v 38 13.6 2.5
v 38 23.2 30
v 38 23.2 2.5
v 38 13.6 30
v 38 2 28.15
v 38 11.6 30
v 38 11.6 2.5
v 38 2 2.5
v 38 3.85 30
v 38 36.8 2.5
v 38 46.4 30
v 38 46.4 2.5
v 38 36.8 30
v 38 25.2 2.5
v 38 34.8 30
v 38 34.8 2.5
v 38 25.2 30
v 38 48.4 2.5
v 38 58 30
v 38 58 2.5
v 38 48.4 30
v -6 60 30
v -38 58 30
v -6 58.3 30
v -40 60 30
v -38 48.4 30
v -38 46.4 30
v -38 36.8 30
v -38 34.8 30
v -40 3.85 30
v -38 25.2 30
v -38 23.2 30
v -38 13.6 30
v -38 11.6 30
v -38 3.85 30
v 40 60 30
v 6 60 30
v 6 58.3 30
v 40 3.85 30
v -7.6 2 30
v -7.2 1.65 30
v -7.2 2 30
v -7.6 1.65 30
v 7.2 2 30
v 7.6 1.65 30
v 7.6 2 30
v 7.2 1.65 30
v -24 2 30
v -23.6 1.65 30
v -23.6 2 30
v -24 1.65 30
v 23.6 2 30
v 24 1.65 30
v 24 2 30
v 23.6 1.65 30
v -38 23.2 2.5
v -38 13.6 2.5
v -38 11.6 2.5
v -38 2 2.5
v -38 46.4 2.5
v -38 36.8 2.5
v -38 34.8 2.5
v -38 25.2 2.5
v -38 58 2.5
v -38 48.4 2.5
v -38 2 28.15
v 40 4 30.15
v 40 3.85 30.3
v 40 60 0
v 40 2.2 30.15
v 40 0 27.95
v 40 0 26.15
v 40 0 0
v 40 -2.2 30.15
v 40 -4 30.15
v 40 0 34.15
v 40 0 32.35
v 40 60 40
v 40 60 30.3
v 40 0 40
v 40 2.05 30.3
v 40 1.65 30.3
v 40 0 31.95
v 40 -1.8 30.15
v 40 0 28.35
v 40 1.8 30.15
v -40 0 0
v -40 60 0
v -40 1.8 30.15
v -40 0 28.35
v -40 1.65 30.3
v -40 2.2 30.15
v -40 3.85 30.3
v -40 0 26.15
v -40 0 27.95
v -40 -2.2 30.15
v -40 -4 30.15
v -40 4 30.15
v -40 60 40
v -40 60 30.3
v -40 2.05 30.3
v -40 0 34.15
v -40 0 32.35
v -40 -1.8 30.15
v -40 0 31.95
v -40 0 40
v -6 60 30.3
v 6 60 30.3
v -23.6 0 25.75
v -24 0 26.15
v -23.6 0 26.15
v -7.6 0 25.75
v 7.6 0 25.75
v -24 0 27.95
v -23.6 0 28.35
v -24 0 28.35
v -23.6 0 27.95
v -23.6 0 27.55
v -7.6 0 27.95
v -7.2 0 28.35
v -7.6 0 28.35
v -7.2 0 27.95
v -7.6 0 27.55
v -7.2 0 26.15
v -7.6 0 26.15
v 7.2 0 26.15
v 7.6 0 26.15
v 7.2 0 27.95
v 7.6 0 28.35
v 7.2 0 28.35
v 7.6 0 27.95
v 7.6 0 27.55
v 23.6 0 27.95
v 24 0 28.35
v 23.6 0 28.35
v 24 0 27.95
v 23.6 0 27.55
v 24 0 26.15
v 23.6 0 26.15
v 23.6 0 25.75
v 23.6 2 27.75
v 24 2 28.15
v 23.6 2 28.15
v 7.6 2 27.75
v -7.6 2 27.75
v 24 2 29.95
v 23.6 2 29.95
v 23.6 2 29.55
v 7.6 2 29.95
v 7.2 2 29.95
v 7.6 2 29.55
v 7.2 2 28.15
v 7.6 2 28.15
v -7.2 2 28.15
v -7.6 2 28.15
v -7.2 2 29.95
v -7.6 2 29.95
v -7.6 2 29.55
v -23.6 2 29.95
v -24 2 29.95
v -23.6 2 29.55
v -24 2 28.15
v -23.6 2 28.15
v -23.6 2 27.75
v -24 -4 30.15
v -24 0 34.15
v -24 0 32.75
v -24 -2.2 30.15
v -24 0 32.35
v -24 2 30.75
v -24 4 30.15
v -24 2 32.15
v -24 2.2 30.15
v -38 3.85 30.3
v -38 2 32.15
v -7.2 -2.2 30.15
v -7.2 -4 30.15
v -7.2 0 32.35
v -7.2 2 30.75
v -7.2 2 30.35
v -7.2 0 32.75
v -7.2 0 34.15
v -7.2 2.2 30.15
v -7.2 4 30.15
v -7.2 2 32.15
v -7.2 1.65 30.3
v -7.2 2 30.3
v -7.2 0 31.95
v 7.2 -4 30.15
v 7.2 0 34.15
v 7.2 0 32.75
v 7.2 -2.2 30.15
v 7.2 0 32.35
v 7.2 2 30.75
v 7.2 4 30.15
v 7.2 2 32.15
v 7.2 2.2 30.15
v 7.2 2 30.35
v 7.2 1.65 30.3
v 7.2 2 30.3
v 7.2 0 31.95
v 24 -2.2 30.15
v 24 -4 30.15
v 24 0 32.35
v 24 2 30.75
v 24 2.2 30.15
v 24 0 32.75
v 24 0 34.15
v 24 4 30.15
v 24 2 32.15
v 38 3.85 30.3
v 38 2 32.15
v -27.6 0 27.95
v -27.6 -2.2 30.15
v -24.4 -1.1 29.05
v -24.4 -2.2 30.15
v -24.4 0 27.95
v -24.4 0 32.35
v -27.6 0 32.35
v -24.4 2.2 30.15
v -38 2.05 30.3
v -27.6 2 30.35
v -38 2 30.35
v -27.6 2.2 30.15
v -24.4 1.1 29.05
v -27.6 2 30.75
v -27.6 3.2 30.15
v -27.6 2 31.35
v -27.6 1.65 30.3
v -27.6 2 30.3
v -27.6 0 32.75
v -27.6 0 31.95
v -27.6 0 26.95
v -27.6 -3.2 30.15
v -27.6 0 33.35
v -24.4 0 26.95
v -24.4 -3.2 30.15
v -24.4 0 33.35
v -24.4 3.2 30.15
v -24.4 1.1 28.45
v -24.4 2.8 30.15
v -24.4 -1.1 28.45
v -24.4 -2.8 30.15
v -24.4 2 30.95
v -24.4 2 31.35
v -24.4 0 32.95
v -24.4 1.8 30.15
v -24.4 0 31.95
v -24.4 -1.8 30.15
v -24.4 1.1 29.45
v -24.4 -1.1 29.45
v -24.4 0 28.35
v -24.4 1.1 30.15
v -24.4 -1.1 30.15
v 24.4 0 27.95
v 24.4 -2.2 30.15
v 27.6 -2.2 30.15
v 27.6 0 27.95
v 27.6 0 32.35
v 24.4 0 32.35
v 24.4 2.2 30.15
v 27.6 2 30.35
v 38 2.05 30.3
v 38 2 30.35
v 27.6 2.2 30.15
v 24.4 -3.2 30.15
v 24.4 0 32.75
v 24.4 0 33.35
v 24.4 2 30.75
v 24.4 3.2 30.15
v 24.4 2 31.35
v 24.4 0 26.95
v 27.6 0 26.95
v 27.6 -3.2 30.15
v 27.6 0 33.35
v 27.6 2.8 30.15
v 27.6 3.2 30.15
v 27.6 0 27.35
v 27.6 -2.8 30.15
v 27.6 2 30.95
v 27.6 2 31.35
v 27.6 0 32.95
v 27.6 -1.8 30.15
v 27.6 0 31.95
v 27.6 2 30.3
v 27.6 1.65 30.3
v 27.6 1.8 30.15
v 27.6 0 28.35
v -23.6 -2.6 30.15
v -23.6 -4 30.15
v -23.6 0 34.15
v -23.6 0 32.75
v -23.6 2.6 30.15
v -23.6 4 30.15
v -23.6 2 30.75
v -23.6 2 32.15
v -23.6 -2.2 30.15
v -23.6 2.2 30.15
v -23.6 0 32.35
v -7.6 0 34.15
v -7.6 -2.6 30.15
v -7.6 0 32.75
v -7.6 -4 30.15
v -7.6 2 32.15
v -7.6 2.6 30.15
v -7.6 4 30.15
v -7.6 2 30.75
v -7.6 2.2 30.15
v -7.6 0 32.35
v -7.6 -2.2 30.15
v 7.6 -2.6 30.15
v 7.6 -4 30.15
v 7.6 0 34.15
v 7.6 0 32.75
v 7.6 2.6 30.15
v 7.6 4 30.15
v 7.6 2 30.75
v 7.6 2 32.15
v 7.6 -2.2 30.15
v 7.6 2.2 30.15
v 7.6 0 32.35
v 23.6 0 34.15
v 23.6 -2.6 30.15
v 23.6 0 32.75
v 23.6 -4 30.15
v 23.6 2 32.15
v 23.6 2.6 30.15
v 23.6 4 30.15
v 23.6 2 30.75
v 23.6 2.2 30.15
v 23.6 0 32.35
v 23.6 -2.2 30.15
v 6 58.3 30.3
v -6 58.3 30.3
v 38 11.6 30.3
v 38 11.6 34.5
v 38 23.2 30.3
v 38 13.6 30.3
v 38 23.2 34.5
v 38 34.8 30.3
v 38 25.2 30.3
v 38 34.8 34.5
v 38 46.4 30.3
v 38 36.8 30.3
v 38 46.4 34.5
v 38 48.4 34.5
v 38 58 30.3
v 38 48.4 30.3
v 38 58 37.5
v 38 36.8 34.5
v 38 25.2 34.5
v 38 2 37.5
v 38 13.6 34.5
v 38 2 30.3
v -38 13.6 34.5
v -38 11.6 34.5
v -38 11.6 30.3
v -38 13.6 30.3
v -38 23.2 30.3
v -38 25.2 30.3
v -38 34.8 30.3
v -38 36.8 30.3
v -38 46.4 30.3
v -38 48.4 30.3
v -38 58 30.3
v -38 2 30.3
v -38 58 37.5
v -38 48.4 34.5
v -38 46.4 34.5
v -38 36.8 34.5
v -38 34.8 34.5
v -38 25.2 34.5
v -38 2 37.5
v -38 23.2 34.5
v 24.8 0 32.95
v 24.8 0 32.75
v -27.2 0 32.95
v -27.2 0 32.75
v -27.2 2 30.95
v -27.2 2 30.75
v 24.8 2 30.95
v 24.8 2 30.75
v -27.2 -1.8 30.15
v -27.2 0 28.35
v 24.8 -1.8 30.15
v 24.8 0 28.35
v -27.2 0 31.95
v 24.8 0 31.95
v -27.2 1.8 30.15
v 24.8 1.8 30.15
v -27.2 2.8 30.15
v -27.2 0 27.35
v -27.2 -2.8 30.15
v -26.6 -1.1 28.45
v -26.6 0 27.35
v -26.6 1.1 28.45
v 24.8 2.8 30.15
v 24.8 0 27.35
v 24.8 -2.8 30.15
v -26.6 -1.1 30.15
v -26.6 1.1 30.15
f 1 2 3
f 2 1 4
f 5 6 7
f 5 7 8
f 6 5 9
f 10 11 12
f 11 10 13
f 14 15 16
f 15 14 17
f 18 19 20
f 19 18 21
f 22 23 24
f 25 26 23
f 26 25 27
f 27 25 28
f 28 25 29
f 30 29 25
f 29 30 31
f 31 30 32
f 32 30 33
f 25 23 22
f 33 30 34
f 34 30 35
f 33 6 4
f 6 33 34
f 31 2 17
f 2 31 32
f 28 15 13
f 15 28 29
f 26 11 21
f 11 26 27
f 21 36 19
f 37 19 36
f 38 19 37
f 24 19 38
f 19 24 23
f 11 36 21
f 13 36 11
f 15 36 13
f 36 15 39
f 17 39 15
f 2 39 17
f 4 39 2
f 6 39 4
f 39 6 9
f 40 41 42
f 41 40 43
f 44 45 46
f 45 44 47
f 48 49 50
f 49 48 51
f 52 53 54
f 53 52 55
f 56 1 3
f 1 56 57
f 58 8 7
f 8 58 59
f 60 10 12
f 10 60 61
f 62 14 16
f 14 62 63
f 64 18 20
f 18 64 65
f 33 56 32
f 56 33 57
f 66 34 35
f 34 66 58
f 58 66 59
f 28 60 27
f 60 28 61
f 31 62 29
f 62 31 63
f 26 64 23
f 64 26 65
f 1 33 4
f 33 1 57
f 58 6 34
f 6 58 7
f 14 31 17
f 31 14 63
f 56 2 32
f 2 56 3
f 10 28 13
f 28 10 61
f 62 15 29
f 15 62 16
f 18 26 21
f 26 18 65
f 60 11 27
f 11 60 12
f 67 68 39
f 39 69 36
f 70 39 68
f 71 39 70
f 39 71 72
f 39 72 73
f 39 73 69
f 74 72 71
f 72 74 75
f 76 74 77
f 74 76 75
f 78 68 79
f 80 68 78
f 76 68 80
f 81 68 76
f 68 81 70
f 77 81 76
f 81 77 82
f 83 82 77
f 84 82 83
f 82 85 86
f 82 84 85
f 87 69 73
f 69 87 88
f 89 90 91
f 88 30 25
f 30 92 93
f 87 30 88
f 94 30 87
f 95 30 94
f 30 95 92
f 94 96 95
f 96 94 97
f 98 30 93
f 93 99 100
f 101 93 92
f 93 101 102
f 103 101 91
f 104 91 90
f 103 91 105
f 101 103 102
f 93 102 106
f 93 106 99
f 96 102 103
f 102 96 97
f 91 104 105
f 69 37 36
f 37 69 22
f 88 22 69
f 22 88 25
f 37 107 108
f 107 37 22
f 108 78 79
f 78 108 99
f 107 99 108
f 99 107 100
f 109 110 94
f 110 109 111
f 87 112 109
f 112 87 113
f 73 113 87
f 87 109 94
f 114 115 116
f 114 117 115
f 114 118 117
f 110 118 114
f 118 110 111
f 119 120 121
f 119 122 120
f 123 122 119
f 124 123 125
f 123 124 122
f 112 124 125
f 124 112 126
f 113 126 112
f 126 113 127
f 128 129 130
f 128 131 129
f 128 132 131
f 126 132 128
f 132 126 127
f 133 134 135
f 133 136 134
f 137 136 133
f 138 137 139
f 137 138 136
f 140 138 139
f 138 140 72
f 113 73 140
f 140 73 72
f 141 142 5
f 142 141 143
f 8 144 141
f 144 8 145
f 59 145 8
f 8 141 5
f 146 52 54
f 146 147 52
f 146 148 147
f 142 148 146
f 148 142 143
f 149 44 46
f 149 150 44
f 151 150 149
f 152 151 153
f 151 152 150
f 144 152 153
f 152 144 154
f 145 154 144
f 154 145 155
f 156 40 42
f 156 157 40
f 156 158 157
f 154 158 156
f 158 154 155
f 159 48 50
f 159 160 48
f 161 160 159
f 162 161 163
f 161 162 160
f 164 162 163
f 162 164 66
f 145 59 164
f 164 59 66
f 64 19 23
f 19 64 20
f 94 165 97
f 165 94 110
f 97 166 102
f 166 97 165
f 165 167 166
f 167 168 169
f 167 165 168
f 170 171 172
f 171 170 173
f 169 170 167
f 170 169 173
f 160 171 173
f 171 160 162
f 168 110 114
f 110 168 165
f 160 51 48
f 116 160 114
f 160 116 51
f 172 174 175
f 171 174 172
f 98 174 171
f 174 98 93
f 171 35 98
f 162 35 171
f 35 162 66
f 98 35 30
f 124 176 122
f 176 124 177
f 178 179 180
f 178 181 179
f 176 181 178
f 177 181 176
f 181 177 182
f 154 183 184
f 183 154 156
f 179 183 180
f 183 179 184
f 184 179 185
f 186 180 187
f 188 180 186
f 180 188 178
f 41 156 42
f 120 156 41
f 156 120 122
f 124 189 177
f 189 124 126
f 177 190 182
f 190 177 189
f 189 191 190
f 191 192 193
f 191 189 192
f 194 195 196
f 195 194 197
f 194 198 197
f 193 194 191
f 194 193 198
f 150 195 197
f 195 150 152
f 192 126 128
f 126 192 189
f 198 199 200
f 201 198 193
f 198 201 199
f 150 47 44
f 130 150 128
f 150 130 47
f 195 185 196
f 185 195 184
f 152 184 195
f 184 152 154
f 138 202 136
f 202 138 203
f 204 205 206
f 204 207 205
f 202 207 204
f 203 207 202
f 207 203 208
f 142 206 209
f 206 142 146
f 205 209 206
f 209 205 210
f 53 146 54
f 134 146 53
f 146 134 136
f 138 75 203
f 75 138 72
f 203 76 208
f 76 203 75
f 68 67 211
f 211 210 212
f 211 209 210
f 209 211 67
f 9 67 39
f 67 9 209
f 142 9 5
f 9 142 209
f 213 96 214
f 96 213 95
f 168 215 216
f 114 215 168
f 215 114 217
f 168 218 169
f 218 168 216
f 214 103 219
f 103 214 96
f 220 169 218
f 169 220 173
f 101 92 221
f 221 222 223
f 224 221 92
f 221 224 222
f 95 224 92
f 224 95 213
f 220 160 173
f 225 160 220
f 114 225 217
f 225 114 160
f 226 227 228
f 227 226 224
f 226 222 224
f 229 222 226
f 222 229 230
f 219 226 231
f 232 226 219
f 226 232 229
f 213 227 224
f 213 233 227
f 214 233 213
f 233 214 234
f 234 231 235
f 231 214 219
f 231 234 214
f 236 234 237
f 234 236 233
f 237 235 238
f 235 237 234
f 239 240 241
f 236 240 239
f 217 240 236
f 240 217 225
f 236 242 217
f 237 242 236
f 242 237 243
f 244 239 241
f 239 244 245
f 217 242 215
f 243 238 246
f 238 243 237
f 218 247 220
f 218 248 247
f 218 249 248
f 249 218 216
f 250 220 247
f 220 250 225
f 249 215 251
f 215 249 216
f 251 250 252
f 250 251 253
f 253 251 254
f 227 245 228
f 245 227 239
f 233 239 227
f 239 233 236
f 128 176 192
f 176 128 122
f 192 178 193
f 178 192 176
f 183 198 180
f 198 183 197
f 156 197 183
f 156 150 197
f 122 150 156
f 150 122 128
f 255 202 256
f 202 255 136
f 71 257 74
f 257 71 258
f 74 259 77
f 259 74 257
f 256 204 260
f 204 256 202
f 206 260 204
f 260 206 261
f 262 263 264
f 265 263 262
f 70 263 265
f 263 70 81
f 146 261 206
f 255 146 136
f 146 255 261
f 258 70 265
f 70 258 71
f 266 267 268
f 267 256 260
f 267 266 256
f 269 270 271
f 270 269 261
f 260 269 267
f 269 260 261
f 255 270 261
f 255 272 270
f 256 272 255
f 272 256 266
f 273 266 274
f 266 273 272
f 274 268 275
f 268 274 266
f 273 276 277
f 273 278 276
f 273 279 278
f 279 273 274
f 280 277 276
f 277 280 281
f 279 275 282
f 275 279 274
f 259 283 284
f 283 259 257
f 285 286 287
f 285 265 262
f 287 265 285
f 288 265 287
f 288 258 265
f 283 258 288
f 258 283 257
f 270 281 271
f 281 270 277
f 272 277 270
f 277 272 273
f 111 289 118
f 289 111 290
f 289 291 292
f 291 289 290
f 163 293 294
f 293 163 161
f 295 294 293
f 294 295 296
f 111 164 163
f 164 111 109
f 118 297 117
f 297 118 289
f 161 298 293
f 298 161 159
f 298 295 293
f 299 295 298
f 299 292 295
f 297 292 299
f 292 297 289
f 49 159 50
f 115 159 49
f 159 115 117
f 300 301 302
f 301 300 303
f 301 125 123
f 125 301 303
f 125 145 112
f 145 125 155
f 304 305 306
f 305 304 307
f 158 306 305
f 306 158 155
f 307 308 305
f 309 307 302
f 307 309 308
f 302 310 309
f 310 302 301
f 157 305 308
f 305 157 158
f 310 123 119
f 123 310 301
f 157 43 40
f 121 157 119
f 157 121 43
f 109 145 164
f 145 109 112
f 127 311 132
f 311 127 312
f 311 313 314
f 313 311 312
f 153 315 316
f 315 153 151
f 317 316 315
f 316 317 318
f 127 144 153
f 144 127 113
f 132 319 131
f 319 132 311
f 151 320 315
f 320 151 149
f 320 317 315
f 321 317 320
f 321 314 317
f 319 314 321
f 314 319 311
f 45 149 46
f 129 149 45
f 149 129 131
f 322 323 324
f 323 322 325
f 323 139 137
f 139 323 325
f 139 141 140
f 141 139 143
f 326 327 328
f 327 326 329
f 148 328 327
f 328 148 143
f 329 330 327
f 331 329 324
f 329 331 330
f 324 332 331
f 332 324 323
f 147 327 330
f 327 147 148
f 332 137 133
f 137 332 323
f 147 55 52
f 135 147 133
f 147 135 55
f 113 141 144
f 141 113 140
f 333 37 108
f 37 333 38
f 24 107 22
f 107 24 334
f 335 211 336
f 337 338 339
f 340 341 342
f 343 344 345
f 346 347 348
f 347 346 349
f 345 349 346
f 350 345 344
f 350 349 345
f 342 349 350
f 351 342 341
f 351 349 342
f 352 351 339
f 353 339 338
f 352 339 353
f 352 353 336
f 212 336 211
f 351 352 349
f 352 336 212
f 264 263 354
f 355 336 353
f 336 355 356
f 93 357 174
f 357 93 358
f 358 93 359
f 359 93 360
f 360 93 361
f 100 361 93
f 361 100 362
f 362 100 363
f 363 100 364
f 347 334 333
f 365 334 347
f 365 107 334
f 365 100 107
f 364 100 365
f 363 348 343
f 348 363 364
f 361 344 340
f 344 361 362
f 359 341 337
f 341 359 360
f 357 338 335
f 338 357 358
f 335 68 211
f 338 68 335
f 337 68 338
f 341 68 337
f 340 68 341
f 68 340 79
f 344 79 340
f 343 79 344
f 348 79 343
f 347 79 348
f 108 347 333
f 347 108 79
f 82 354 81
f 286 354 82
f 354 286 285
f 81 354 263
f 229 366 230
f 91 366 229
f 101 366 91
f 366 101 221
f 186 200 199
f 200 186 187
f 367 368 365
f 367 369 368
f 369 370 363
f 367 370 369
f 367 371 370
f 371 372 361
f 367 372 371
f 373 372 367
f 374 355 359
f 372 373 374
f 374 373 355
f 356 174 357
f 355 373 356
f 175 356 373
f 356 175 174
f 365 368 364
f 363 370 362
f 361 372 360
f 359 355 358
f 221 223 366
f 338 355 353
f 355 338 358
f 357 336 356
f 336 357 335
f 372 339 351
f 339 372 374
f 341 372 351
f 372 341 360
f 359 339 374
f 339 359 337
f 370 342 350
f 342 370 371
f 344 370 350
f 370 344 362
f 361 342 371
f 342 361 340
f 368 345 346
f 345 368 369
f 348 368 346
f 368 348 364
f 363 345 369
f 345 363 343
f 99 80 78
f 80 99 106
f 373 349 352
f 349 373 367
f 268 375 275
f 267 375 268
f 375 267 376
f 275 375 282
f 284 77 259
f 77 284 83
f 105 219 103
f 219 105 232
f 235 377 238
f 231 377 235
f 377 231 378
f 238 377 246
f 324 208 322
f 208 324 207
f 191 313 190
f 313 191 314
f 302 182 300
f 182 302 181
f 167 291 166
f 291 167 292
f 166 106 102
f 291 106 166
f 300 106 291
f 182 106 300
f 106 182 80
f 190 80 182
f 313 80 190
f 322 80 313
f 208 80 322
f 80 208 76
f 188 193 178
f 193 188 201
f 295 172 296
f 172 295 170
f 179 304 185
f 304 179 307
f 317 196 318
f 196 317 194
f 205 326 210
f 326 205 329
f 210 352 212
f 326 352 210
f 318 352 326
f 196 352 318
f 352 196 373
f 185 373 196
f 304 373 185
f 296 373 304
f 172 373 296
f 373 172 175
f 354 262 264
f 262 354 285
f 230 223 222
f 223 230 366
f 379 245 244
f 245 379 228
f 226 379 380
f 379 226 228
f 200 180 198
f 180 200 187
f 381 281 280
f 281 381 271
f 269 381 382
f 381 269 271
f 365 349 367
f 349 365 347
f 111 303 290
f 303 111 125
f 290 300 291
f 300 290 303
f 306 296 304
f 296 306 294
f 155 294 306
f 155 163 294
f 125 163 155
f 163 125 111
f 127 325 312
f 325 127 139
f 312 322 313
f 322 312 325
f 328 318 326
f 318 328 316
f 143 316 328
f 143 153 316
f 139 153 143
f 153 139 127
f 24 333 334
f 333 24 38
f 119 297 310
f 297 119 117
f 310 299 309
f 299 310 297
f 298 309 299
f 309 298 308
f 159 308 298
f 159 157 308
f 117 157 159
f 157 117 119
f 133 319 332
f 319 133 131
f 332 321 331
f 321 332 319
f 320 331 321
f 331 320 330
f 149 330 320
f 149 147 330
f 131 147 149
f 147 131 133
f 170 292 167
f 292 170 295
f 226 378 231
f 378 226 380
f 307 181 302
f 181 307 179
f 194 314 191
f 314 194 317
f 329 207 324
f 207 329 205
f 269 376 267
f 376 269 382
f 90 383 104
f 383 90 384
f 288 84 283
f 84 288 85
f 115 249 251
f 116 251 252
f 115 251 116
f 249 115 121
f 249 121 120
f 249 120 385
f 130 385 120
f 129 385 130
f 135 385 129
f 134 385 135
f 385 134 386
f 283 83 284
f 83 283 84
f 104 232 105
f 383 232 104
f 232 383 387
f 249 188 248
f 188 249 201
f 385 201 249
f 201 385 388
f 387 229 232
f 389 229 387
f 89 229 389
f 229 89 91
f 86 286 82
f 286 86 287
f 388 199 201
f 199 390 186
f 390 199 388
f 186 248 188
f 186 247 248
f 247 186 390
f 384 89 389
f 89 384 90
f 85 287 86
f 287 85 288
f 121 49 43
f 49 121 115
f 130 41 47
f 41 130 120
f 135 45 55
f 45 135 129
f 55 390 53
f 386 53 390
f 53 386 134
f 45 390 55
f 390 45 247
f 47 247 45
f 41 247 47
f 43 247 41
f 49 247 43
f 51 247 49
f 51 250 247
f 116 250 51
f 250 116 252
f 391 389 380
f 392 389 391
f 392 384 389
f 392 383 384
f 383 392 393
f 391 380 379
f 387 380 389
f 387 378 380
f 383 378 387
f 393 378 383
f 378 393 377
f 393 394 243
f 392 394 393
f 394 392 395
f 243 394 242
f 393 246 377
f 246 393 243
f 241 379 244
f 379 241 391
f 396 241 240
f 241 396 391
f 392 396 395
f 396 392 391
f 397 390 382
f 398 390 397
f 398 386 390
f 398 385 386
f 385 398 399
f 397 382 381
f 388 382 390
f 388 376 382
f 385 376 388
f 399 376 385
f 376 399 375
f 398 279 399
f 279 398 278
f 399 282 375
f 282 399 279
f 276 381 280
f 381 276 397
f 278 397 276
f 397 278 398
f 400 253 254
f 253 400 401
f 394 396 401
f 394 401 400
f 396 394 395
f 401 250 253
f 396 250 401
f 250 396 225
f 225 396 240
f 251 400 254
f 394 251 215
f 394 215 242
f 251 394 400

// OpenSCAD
/* Box with print-in-place hinge - step 1: params + base */
part = "assembly"; // [base, lid, pin, assembly]

cadverify_only = "";
module instance(name, part, unit = 1) {
    echo(cadverify_instance = [name, part, unit]);
    if (cadverify_only == "" || cadverify_only == name) children();
}

// ---- parameters (mm) ----
W = 80; D = 60; H = 40;          // body outer, closed
baseH = 30;                      // base height
gapZLid = 0.3;                   // lid-base vertical gap
lidBot = baseH + gapZLid;        // 30.3
lidTop = H;                      // 40
axY = 2; axZ = baseH + gapZLid/2; // hinge axis (2, 30.15)
wallT = 2; floorT = 2.5; lidTopT = 2.5;
pinH = 1.8; boreH = 2.2; outH = 4.0; cbH = 3.2; capH = 2.8;
clrR = 0.4; clrA = 0.4;
divT = 2; divTop = 37.2;

// knuckle X intervals
bx10=-40; bx11=-24; lx10=-23.6; lx11=-7.6;
bx20=-7.2; bx21=7.2; lx20=7.6; lx21=23.6; bx30=24; bx31=40;

// generic prism along X from polygon in (Z,Y) mapped: poly points [z,y]
module prism_x(poly, x0, len) {
    translate([x0, 0, 0]) rotate([0,90,0])
        linear_extrude(height=len) polygon(poly);
}
function diamond(h) = [[-h,0],[0,-h],[h,0],[0,h]];

module knuckle_out(x0, len) {
    // diamond cross-section points [z,y] centered at (axZ, axY)
    p = diamond(outH);
    translate([0, axY, axZ]) prism_x(p, x0, len);
}
module bore_small(x0, len) {
    p = diamond(boreH);
    translate([0, axY, axZ]) prism_x(p, x0, len);
}
module bore_cb(x0, len) {
    p = diamond(cbH);
    translate([0, axY, axZ]) prism_x(p, x0, len);
}

function D(h,y0,z0) = [[-z0+h,y0],[-z0,y0-h],[-z0-h,y0],[-z0,y0+h]];
module dia(h,y0,z0,x0,x1) {
    translate([x0,0,0]) rotate([0,90,0])
        linear_extrude(height=x1-x0, convexity=4) polygon(D(h,y0,z0));
}
module base_geo() {
    difference() {
        union() {
            translate([-40,0,0]) cube([80,60,2.5]);            // floor
            translate([-40,0,0]) cube([80,2,30]);              // back wall
            translate([-40,58,0]) cube([80,2,30]);             // front wall
            translate([-40,2,0]) cube([2,56,30]);              // left wall
            translate([38,2,0]) cube([2,56,30]);               // right wall
            for (cy=[12.6,24.2,35.8,47.4])
                translate([-38,cy-1,2.5]) cube([76,2,27.5]);   // dividers
            dia(outH,0,axZ,bx10,bx11);                         // knuckles
            dia(outH,0,axZ,bx20,bx21);
            dia(outH,0,axZ,bx30,bx31);
        }
        // bore channels + cap pockets
        dia(boreH,0,axZ,bx10,bx11); dia(cbH,0,axZ,-27.6,-24.4);
        dia(boreH,0,axZ,bx20,bx21);
        dia(boreH,0,axZ,bx30,bx31); dia(cbH,0,axZ,24.4,27.6);
        // back-wall notches under lid knuckles (clear outer +0.4)
        dia(outH+clrR,0,axZ,lx10,lx11);
        dia(outH+clrR,0,axZ,lx20,lx21);
        // catch groove in front wall outer face (open top + outer)
        translate([-6,58.6,27.5]) cube([12,1.41,2.51]);
    }
}

module lid_geo() {
    difference() {
        union() {
            // top plate: x -40..40, y 0..60, z 37.5..40
            translate([-40,0,37.5]) cube([80,60,2.5]);
            // lid skirt walls 2mm, y 0..60, z 30.3..37.5
            translate([-40,0,30.3]) cube([80,2,7.2]);    // back band
            translate([-40,58,30.3]) cube([80,2,7.2]);   // front band
            translate([-40,2,30.3]) cube([2,56,7.2]);    // left band
            translate([38,2,30.3]) cube([2,56,7.2]);     // right band
            // lid skirt inner closure panels (also skirt divider walls)
            for (cy=[12.6,24.2,35.8,47.4])
                translate([-38,cy-1,30.3]) cube([76,2,4.2]);  // up to 34.5
            // lid knuckles + catch tongue
            dia(outH,0,axZ,lx10,lx11);
            dia(outH,0,axZ,lx20,lx21);
            translate([-6,58.3,27.5]) cube([12,1.7,3.4]);  // tongue tab below front band
        }
        // bore channels
        dia(boreH,0,axZ,lx10,lx11);
        dia(boreH,0,axZ,lx20,lx21);
        // clearance pockets opposite base knuckles
        dia(boreH+clrR,0,axZ,-27.6,-23.6);
        dia(boreH+clrR,0,axZ,-7.6,-7.2);
        dia(boreH+clrR,0,axZ,7.2,7.6);
        dia(boreH+clrR,0,axZ,23.6,27.6);
    }
}
module pin_geo() {
    difference() {
        union() {
            // shaft full hinge length x -40..40
            dia(pinH,0,axZ,-40,40);
            // retaining collars trapped in base counterbores
            dia(capH,0,axZ,-27.2,-24.4);      // left head in pocket -27.6..-24.4
            dia(capH,0,axZ,24.8,27.6);        // right head in pocket 24.4..27.6
        }
        // left head slot (screwdriver grip) open at bottom
        translate([-26.6,-1.1,axZ-14]) cube([2.2,2.2,14]);
    }
}
// --- part orientation helpers + spec + assembly ---

if (part=="base") { base_geo(); }
else if (part=="lid") { lid_geo(); }
else if (part=="pin") { pin_geo(); }
else if (part=="assembly") {
    instance("base","base") base_geo();
    instance("lid","lid") lid_geo();
    instance("pin","pin") pin_geo();
}
